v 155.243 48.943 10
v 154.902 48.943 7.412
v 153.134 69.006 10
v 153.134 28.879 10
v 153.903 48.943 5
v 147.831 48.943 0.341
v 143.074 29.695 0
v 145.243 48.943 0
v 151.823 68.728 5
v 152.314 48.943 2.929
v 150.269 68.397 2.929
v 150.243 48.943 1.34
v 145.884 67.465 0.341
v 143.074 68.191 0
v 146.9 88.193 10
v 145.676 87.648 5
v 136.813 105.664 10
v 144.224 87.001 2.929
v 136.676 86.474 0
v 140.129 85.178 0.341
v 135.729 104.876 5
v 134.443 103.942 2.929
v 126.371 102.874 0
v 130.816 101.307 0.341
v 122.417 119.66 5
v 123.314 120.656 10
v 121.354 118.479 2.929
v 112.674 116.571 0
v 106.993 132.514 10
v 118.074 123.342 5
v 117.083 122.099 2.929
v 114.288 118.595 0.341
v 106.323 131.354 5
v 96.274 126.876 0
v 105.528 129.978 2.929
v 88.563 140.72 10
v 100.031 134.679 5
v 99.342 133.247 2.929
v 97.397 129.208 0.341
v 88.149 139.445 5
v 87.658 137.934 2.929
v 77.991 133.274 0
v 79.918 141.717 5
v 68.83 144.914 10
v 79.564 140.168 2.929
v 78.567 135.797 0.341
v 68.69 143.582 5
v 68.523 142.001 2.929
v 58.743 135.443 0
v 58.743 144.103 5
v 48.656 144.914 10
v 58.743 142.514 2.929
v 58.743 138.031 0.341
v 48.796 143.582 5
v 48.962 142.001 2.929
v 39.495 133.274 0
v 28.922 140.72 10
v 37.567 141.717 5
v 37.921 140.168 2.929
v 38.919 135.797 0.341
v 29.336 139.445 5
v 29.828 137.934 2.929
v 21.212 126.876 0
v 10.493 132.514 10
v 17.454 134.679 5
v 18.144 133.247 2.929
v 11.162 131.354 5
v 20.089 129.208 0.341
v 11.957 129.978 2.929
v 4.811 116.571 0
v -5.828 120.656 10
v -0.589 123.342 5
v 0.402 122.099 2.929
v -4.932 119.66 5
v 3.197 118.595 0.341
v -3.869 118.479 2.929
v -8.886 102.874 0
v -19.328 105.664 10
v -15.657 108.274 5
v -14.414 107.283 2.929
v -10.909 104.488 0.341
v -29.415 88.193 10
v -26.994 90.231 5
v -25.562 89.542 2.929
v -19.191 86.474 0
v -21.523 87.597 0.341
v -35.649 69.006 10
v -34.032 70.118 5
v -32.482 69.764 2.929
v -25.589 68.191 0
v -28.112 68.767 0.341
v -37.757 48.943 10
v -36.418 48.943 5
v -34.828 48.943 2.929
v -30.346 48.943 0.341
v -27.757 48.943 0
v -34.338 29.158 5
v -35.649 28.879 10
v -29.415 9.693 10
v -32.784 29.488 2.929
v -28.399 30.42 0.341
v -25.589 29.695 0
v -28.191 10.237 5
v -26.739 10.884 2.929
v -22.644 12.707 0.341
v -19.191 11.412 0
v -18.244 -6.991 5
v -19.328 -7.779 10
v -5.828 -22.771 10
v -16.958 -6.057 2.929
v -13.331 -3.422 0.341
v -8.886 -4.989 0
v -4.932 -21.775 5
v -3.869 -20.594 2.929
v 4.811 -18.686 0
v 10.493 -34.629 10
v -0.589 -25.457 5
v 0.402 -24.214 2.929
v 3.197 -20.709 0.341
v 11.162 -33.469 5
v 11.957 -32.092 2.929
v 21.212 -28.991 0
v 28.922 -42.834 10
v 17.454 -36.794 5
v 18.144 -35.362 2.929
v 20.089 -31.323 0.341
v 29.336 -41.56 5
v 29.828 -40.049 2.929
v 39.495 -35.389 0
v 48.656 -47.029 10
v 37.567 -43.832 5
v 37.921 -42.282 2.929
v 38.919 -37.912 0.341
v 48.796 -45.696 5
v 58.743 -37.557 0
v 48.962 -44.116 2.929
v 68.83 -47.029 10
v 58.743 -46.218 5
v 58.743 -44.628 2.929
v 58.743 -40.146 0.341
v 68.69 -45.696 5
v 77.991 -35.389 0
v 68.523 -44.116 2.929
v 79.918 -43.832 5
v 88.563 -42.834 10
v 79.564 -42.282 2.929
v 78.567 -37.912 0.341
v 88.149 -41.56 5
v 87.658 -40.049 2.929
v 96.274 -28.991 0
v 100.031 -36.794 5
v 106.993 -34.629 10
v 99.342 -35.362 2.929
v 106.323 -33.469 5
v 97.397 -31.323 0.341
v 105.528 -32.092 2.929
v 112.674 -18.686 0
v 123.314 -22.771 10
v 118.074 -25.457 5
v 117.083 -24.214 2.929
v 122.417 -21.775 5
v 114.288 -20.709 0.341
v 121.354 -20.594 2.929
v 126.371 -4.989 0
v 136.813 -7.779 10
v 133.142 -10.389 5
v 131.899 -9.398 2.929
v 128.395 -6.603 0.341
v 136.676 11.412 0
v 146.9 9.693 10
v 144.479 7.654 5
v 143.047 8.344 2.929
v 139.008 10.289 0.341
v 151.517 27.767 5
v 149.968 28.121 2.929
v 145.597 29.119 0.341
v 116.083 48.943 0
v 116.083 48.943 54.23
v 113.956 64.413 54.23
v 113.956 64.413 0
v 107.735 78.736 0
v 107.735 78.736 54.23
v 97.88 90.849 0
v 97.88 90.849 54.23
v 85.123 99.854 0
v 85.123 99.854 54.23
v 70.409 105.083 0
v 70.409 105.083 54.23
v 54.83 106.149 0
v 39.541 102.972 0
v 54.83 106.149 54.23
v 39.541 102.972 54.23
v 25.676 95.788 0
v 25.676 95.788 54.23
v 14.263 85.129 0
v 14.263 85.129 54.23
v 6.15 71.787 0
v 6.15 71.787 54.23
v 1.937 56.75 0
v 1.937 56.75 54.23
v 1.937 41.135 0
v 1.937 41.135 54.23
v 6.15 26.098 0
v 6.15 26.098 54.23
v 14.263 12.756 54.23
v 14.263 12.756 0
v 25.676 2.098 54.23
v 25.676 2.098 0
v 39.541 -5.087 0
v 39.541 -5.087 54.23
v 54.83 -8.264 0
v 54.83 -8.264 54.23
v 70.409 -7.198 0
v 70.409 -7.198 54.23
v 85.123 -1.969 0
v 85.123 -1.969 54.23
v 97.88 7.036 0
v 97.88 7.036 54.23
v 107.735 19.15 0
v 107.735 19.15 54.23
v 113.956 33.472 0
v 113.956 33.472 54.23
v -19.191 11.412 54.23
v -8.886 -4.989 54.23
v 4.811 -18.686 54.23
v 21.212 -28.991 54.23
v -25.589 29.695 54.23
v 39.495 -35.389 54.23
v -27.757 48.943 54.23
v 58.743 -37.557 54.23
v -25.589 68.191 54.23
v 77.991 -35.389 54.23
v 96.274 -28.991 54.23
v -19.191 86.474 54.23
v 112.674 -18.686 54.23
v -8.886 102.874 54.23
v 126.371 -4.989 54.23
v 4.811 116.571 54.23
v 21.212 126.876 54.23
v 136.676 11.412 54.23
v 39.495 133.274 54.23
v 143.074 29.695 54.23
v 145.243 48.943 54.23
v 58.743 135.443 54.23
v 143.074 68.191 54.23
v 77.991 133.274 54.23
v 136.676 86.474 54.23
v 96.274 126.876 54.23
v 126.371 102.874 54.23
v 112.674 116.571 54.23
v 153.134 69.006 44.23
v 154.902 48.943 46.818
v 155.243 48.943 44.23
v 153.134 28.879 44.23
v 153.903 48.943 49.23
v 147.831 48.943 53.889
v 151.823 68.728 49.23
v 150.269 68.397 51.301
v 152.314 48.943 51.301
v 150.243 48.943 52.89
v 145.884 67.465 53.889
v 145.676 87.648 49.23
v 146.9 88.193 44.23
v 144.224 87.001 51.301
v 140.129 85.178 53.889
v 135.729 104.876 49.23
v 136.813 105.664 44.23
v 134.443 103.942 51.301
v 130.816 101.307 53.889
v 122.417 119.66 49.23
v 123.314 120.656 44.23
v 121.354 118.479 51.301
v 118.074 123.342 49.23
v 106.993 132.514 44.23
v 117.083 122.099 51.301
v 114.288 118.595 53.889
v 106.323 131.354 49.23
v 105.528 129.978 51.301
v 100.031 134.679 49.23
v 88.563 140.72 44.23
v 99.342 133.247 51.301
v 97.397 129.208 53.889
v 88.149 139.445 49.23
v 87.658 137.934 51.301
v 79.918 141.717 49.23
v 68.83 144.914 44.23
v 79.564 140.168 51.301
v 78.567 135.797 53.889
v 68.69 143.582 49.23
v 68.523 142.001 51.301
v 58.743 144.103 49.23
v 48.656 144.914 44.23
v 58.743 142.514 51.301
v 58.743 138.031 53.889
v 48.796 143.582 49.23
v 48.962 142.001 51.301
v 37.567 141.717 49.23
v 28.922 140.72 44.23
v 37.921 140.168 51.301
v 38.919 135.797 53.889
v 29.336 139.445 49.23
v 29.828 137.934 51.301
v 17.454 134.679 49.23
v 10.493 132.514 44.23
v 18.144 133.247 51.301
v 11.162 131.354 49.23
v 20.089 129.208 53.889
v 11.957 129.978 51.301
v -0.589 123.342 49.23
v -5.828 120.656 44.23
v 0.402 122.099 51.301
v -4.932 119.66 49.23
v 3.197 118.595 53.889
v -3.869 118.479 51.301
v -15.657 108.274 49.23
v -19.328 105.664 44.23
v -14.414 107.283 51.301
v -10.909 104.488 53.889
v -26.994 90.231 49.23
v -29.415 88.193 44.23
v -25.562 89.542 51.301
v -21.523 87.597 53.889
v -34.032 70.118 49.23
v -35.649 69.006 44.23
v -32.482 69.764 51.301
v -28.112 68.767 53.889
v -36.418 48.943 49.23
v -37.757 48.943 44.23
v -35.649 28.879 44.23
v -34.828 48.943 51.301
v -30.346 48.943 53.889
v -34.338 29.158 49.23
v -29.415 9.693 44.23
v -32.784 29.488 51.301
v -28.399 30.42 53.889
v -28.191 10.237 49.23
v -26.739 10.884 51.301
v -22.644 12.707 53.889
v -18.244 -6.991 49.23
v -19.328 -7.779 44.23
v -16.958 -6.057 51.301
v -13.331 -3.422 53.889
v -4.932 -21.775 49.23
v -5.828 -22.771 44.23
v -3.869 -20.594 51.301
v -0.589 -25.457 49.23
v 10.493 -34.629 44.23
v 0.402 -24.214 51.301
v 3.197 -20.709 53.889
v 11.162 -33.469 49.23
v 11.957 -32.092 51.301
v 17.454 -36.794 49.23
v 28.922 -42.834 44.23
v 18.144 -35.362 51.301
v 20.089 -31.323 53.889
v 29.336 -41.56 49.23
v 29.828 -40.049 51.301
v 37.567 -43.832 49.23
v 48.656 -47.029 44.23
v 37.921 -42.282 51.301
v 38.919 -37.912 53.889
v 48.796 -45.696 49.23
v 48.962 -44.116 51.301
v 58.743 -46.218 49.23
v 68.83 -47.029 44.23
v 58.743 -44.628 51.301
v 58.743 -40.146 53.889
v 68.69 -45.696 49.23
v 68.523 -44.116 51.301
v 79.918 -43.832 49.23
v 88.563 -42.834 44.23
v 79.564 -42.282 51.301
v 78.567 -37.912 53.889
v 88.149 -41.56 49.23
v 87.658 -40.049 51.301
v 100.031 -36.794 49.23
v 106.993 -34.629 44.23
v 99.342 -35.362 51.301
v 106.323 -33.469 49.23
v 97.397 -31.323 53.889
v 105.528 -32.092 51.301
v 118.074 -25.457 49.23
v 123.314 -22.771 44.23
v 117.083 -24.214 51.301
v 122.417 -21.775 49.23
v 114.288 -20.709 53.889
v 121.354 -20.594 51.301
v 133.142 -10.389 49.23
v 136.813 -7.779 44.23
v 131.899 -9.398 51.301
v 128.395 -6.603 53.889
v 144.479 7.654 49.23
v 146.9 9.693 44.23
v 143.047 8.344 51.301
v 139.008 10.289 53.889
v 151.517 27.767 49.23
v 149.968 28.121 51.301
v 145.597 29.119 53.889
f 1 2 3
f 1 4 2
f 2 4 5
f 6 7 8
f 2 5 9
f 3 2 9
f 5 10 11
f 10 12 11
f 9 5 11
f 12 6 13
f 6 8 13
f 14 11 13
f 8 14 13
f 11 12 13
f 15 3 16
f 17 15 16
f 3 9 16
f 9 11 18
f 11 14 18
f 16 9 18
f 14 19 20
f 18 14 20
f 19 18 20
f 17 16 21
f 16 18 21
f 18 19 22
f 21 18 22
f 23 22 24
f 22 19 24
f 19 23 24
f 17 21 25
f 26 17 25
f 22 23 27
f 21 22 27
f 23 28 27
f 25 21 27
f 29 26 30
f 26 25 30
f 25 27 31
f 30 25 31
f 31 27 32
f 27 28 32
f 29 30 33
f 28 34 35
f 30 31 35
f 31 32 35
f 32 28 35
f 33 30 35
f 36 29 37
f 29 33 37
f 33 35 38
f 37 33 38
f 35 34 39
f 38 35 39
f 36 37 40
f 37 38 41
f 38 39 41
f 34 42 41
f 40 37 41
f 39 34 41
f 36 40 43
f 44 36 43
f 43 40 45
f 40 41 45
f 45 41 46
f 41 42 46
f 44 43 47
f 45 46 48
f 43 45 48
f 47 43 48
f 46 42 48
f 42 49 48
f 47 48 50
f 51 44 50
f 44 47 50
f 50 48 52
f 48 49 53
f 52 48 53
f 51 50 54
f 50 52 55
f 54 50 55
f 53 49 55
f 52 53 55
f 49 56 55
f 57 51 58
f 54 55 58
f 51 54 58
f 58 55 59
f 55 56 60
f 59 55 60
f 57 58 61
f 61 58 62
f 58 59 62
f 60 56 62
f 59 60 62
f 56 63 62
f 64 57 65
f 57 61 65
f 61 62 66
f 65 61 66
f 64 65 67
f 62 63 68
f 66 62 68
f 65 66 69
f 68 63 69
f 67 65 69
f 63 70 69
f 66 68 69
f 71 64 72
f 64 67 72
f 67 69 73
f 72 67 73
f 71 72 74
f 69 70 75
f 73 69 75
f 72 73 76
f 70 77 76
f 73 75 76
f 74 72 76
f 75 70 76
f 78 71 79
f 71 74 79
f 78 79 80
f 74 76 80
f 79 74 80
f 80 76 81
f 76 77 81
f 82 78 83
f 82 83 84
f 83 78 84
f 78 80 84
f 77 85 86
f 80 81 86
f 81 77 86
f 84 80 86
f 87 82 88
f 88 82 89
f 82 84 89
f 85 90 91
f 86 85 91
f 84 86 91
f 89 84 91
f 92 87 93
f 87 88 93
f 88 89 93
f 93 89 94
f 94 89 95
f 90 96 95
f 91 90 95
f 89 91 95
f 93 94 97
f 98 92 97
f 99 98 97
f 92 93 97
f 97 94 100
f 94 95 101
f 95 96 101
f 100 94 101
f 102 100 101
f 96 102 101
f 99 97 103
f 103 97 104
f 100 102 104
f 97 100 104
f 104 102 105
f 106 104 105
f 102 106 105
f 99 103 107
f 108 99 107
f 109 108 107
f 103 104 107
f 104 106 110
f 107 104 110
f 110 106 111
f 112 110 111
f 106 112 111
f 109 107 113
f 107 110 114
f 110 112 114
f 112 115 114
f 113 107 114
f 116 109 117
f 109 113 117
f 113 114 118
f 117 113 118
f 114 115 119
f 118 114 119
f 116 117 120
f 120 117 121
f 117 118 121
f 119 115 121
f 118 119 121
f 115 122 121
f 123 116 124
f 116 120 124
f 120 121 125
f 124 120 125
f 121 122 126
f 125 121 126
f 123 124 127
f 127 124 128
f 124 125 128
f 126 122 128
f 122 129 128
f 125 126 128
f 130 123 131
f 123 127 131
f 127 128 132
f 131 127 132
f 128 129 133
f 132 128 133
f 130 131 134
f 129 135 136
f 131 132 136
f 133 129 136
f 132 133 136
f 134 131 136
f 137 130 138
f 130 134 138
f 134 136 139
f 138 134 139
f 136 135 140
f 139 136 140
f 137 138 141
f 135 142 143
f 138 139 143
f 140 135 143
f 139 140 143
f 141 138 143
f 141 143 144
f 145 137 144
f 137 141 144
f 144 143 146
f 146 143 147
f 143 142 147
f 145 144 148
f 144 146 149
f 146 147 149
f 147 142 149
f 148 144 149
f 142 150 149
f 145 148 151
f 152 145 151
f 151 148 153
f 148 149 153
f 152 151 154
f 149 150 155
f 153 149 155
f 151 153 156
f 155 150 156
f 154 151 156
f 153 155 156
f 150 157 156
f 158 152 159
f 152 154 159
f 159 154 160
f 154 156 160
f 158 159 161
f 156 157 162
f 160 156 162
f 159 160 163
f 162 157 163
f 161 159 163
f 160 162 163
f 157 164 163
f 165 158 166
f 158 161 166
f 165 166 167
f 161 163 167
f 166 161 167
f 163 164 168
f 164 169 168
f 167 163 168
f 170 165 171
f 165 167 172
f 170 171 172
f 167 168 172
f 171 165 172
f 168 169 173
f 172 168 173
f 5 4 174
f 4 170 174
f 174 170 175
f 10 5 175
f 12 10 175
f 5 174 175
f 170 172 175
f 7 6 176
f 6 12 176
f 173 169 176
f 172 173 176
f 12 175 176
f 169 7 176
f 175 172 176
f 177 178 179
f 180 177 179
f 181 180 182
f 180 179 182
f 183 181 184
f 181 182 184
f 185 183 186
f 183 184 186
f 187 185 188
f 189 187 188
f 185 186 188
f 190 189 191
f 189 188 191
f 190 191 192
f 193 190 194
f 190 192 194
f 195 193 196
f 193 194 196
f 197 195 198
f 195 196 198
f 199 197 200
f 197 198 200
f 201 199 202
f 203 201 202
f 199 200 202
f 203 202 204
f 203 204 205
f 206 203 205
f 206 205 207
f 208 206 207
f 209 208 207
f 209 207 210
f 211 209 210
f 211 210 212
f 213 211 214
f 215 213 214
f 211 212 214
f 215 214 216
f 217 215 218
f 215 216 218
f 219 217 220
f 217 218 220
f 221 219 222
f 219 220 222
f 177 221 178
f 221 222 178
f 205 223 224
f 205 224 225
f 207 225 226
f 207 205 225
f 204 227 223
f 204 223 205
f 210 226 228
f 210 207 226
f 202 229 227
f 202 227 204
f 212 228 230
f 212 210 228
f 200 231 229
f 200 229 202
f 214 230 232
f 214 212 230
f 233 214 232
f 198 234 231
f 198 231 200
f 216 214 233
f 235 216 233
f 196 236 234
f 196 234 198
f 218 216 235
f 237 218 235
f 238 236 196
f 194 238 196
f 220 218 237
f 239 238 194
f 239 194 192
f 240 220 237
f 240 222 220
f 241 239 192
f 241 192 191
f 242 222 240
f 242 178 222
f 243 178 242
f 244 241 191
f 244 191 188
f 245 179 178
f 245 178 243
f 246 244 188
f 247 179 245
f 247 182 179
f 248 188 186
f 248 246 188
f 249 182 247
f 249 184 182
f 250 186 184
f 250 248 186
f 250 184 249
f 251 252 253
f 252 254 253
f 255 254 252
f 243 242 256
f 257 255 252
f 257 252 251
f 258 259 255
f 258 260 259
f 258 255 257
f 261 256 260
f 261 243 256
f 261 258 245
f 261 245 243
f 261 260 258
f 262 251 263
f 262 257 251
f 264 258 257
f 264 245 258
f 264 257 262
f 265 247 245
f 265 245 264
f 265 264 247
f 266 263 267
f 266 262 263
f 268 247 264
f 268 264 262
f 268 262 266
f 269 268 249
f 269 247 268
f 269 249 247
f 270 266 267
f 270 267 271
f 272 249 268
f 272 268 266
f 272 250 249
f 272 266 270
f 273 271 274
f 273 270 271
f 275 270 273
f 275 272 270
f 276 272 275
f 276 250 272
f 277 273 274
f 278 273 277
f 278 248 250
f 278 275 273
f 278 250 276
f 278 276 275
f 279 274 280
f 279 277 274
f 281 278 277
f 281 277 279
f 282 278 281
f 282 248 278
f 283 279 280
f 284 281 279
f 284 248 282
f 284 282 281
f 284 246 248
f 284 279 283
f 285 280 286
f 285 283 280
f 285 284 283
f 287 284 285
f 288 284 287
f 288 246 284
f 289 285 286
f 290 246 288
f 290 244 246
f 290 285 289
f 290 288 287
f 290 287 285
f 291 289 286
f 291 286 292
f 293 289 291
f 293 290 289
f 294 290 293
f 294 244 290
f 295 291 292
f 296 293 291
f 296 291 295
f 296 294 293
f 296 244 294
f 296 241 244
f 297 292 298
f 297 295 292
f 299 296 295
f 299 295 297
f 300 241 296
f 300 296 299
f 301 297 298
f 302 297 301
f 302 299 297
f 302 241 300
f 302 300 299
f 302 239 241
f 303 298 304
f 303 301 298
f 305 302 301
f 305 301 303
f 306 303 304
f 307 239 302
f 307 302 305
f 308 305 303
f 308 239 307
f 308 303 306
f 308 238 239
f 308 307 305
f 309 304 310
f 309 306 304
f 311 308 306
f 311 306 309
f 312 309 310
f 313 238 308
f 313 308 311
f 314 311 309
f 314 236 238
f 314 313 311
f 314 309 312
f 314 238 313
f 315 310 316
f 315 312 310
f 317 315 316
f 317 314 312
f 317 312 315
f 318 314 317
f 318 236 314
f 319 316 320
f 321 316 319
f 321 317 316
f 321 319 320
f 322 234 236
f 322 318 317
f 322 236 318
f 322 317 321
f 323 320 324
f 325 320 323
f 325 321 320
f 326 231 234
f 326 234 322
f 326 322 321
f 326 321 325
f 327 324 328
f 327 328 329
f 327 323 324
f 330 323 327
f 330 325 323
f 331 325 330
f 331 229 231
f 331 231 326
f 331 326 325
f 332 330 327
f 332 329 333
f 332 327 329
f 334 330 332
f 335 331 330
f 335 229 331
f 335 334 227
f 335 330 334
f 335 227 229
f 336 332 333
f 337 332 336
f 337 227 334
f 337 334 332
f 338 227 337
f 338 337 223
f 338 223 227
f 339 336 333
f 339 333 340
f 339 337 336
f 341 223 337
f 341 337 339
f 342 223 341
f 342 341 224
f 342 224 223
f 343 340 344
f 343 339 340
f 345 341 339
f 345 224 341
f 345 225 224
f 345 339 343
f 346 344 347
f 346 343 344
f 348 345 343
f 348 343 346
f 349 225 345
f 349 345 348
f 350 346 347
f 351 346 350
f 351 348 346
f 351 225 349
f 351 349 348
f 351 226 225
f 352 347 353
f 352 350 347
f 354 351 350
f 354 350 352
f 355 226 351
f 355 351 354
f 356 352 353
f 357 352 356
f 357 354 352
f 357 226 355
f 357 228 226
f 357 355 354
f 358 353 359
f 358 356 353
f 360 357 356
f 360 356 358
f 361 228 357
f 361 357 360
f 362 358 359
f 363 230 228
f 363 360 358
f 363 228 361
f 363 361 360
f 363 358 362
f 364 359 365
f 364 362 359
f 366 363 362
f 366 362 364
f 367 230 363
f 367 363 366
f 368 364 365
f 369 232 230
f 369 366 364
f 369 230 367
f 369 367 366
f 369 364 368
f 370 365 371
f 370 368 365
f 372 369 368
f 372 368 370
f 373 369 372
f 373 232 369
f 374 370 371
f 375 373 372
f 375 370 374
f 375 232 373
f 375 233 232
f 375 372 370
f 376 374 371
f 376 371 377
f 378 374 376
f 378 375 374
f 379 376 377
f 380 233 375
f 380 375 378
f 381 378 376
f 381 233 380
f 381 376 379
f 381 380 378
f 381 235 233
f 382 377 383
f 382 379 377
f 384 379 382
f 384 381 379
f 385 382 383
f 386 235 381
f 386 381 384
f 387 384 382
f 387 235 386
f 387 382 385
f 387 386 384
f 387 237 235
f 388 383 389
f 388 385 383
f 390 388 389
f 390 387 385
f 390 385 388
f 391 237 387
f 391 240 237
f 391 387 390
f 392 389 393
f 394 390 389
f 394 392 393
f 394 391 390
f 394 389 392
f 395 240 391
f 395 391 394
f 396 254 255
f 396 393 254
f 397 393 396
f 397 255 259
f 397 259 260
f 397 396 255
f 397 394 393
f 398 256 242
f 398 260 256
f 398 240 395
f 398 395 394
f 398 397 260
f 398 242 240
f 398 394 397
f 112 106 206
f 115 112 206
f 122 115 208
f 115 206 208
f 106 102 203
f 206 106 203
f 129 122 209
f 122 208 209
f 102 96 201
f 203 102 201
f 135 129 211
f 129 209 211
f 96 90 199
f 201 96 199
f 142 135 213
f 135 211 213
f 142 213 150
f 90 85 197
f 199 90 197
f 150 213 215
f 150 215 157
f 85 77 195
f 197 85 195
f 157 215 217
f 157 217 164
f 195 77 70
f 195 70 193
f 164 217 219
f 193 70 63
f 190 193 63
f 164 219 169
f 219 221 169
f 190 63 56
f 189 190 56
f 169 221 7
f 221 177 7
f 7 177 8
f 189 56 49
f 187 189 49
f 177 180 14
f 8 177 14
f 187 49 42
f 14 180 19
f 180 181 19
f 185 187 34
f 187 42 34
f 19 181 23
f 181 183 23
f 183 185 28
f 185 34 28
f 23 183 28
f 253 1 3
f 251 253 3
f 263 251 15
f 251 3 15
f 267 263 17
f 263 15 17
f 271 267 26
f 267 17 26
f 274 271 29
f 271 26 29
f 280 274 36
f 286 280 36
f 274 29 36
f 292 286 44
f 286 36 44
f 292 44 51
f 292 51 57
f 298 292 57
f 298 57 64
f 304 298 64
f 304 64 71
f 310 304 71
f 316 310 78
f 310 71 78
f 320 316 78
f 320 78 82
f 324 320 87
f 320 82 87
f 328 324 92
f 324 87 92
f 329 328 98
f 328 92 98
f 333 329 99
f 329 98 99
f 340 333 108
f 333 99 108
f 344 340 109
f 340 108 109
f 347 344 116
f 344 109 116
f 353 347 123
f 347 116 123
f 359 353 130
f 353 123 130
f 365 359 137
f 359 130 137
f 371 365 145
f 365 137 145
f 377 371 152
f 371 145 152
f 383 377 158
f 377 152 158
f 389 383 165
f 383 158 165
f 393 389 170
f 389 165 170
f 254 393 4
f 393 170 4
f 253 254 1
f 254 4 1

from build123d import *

# Parameters (mm, degrees)
SKETCH_3_R          = 96.5
EXTRUDE_1_DEPTH     = 54.23
FILLET_1_R          = 10
SKETCH_4_R          = 57.34
CUT_EXTRUDE_1_DEPTH = 54.23


with BuildPart() as part:
    # 草图3 → 凸台-拉伸1 (new body)
    with BuildSketch(Plane.XY):
        with Locations((58.742605219, 48.942624637)):
            Circle(SKETCH_3_R)
    extrude(amount=EXTRUDE_1_DEPTH)

    # 圆角1
    fillet_1_edges = [part.edges().sort_by_distance(p)[0] for p in [
        (-37.757394781, 48.942624637, 0),
        (-37.757394781, 48.942624637, 54.23),
    ]]
    fillet(fillet_1_edges, radius=FILLET_1_R)

    # 草图4 → 切除-拉伸1 (cut)
    with BuildSketch(Plane.XY.offset(54.23)):
        with Locations((58.742605219, 48.942624637)):
            Circle(SKETCH_4_R)
    extrude(amount=-CUT_EXTRUDE_1_DEPTH, mode=Mode.SUBTRACT)


solid = part.part
